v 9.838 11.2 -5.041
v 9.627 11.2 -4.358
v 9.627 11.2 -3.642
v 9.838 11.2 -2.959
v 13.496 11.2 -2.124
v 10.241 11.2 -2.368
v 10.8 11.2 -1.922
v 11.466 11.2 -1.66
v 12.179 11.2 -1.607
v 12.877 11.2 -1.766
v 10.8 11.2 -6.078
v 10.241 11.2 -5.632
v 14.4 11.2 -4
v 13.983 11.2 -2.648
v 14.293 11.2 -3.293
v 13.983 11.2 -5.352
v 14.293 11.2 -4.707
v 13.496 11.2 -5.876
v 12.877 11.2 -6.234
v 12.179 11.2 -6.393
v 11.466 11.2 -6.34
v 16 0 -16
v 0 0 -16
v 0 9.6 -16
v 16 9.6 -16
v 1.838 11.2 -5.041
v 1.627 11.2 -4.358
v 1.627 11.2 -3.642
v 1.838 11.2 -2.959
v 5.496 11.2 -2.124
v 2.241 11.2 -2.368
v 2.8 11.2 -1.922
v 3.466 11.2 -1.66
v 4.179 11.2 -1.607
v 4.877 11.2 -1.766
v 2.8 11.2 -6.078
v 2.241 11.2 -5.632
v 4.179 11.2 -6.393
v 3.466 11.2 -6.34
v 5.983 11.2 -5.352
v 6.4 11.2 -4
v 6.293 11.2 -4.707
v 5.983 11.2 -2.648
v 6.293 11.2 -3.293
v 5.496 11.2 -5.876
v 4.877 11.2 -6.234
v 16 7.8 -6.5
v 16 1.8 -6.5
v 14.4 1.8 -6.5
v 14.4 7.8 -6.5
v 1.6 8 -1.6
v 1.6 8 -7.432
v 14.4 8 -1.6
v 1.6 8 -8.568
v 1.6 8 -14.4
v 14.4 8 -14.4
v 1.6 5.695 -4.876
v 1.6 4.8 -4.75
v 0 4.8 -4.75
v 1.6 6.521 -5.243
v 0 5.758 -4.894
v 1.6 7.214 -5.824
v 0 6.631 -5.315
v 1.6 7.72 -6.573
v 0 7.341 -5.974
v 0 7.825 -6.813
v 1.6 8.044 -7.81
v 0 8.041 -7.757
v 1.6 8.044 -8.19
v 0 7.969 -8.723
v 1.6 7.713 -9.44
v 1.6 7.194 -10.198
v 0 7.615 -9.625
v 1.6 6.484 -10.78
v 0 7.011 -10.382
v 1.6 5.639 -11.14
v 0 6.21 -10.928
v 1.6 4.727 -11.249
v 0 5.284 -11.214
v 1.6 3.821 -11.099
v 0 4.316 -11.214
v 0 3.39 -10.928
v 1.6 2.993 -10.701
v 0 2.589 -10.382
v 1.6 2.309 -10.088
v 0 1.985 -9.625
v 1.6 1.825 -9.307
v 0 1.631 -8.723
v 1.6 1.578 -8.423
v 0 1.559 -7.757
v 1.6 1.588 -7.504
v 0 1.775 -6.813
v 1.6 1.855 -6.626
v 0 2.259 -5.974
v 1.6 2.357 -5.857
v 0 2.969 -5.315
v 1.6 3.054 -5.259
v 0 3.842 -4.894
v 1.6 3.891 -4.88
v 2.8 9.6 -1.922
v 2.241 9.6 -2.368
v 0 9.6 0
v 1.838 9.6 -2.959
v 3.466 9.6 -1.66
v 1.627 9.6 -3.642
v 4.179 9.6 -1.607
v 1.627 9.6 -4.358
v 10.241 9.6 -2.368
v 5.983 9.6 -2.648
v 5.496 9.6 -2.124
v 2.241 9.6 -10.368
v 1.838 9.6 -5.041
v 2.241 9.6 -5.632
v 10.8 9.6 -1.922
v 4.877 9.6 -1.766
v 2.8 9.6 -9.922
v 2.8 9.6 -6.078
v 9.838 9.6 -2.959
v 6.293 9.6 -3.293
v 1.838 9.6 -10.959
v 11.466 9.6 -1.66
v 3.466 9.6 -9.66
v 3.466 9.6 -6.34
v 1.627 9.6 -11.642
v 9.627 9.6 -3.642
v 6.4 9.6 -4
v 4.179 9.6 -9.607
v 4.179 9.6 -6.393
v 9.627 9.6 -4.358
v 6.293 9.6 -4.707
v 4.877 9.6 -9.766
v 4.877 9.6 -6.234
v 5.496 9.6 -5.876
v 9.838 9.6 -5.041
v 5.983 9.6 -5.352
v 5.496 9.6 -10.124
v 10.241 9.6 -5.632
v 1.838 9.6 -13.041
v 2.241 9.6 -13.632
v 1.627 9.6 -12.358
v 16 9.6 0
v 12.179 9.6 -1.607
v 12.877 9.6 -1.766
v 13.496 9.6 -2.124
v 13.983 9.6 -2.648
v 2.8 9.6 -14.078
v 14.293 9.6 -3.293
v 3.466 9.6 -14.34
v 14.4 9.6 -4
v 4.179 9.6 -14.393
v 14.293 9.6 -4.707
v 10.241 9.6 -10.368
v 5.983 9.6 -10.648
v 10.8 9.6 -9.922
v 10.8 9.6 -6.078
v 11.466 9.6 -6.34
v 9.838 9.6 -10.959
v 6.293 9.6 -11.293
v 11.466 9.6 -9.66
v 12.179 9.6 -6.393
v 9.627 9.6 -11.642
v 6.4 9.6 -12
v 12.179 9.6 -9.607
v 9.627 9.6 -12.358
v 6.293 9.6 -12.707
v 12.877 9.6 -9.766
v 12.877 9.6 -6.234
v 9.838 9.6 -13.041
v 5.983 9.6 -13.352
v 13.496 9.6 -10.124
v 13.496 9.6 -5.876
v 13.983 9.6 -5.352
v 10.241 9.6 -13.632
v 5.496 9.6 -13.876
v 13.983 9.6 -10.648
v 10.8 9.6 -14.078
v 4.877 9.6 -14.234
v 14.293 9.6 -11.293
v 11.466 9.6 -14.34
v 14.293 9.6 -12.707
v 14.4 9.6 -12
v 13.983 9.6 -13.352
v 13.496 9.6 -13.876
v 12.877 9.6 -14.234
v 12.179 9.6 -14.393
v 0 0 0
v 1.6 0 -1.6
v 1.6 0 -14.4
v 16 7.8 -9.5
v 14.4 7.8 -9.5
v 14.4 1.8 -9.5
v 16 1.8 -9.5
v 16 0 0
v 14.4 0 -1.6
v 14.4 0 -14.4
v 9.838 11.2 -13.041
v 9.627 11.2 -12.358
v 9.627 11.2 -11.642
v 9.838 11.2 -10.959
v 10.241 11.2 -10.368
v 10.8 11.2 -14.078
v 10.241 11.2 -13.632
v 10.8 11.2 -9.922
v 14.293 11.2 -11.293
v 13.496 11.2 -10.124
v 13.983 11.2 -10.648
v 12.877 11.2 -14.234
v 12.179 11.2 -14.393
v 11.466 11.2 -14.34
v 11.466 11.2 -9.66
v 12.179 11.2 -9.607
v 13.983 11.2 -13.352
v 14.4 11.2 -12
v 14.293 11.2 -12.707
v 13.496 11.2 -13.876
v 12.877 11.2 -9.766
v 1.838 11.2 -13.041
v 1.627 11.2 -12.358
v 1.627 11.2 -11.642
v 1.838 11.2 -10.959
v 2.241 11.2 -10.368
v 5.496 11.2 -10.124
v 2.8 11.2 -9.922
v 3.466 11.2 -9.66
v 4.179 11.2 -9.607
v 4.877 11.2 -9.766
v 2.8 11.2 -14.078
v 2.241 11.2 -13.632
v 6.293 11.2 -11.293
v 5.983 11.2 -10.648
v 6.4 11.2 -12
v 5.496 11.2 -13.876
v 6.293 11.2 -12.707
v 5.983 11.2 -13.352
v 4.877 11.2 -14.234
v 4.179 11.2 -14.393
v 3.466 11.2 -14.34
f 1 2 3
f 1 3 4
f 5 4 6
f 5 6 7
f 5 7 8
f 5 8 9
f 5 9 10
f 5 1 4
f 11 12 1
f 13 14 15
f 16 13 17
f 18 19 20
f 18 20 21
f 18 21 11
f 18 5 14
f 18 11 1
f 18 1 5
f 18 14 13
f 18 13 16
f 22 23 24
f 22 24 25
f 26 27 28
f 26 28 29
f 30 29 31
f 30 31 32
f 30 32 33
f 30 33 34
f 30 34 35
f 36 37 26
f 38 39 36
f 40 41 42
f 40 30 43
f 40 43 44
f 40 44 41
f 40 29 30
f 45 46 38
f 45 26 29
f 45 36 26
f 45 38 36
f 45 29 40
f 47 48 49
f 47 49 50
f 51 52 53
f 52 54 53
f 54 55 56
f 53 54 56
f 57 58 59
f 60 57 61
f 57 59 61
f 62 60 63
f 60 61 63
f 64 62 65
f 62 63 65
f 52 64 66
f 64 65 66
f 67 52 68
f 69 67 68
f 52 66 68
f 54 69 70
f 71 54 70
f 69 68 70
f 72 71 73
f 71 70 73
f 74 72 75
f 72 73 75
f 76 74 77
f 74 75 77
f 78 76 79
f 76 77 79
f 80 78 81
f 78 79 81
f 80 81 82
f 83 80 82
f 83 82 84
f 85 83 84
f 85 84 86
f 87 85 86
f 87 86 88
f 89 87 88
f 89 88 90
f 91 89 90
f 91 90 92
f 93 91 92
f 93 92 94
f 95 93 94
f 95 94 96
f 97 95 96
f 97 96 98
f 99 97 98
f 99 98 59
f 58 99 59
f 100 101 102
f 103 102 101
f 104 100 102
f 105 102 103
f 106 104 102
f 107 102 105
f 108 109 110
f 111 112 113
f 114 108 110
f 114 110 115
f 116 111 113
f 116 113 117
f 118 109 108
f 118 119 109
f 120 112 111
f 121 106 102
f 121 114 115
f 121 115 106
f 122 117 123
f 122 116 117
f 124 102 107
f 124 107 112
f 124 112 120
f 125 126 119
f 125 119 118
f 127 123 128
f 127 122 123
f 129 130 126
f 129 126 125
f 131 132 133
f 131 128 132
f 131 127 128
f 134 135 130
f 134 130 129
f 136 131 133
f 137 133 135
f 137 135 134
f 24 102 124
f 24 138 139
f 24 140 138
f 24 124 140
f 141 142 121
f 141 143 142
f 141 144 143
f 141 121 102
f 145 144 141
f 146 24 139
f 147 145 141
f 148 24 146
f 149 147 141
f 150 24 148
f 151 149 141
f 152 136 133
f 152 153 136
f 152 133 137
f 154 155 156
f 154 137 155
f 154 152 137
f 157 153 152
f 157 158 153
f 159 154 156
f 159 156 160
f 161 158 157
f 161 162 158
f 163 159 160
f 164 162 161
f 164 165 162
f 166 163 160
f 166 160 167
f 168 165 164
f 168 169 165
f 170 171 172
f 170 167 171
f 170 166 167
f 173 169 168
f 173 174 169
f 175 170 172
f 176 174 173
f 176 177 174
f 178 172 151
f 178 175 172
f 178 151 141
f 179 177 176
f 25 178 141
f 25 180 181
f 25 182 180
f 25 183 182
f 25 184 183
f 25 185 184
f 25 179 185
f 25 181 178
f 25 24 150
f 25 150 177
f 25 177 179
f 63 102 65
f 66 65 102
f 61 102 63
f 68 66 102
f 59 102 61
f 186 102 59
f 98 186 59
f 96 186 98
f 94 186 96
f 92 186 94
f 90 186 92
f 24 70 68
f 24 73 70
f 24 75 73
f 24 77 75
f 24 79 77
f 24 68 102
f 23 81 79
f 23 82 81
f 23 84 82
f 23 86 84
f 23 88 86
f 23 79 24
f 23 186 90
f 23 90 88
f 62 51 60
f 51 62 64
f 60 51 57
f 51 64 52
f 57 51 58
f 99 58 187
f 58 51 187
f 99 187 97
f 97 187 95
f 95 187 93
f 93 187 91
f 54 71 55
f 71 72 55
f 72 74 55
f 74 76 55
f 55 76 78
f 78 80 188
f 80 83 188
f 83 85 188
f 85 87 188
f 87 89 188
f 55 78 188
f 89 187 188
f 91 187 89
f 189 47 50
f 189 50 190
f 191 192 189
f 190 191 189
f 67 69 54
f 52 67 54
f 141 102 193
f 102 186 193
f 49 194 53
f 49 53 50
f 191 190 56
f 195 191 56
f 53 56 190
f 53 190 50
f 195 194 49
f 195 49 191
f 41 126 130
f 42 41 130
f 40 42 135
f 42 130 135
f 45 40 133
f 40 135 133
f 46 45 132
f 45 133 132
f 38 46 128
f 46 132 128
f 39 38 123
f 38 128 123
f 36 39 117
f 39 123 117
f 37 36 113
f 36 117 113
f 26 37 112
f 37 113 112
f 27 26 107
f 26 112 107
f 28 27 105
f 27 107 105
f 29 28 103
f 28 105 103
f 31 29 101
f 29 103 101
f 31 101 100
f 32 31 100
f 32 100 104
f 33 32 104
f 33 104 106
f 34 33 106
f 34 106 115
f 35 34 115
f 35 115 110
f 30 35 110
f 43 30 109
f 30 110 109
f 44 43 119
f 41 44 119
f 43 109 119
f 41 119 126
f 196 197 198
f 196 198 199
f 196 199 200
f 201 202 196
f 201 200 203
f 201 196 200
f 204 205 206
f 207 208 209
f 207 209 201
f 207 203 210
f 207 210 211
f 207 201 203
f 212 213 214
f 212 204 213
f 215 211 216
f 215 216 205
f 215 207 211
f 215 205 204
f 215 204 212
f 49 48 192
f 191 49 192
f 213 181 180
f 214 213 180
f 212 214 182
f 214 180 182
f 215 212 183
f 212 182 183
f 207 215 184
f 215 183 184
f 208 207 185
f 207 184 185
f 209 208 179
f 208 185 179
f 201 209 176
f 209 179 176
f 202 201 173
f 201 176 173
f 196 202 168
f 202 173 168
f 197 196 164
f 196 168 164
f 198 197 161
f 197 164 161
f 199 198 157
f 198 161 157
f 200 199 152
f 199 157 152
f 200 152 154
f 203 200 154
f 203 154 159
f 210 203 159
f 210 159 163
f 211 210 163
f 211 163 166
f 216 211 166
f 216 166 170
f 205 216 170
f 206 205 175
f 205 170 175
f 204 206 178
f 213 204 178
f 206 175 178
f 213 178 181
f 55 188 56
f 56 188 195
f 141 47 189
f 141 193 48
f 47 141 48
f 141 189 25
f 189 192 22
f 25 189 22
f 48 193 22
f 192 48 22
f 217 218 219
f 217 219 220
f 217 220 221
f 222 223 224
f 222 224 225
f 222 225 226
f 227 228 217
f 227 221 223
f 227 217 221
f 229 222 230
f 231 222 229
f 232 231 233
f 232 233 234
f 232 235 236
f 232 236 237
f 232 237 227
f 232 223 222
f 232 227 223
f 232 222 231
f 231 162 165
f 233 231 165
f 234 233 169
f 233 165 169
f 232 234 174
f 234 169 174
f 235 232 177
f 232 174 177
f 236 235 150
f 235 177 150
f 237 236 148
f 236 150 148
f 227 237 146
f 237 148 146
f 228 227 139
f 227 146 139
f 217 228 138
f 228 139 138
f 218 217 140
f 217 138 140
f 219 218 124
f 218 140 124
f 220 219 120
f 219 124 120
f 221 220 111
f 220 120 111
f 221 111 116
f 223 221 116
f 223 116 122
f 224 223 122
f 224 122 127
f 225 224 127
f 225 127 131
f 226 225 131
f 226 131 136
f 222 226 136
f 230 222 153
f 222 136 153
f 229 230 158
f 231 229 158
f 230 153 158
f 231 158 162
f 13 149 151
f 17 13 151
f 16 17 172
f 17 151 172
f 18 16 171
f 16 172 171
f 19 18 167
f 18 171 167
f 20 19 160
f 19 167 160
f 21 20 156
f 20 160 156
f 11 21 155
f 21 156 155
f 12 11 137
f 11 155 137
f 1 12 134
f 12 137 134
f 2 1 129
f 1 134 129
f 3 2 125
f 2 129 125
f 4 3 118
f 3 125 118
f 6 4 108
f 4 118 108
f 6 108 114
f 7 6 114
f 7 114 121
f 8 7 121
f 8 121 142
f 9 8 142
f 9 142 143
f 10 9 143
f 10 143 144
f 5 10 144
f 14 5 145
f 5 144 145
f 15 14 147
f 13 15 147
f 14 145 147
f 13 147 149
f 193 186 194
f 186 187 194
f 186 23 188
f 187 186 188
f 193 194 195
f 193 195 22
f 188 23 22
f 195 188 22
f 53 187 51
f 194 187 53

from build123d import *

# Parameters (mm, degrees)
SKETCH1_W           = 16
SKETCH1_H           = 16
SKETCH1_W_2         = 12.8
SKETCH1_H_2         = 12.8
BOSS_EXTRUDE1_DEPTH = 8
SKETCH2_W           = 16
SKETCH2_H           = 16
BOSS_EXTRUDE2_DEPTH = 1.6
SKETCH3_R           = 2.4
BOSS_EXTRUDE3_DEPTH = 1.6
SKETCH4_R           = 3.25
CUT_EXTRUDE1_DEPTH  = 1.6
SKETCH7_W           = 3
SKETCH7_H           = 6
CUT_EXTRUDE2_DEPTH  = 1.6


with BuildPart() as part:
    # Sketch1 → Boss-Extrude1 (new body)
    with BuildSketch(Plane(origin=(0, 0, 0), x_dir=(1, 0, 0), z_dir=(0, 1, 0))):
        with Locations((8, 8)):
            Rectangle(SKETCH1_W, SKETCH1_H)
        with Locations((8, 8)):
            Rectangle(SKETCH1_W_2, SKETCH1_H_2, mode=Mode.SUBTRACT)
    extrude(amount=BOSS_EXTRUDE1_DEPTH)

    # Sketch2 → Boss-Extrude2 (add)
    with BuildSketch(Plane(origin=(0, 8, 0), x_dir=(1, 0, 0), z_dir=(0, 1, 0))):
        with Locations((8, 8)):
            Rectangle(SKETCH2_W, SKETCH2_H)
    extrude(amount=BOSS_EXTRUDE2_DEPTH)

    # Sketch3 → Boss-Extrude3 (add)
    with BuildSketch(Plane(origin=(0, 9.6, 0), x_dir=(1, 0, 0), z_dir=(0, 1, 0))):
        with Locations((12, 4)):
            Circle(SKETCH3_R)
        with Locations((4, 4)):
            Circle(SKETCH3_R)
        with Locations((4, 12)):
            Circle(SKETCH3_R)
        with Locations((12, 12)):
            Circle(SKETCH3_R)
    extrude(amount=BOSS_EXTRUDE3_DEPTH)

    # Sketch4 → Cut-Extrude1 (cut)
    with BuildSketch(Plane.ZY):
        with Locations((-8, 4.8)):
            Circle(SKETCH4_R)
    extrude(amount=-CUT_EXTRUDE1_DEPTH, mode=Mode.SUBTRACT)

    # Sketch7 → Cut-Extrude2 (cut)
    with BuildSketch(Plane(origin=(16, 0, 0), x_dir=(0, 0, -1), z_dir=(1, 0, 0))):
        with Locations((8, 4.8)):
            Rectangle(SKETCH7_W, SKETCH7_H)
    extrude(amount=-CUT_EXTRUDE2_DEPTH, mode=Mode.SUBTRACT)


solid = part.part
